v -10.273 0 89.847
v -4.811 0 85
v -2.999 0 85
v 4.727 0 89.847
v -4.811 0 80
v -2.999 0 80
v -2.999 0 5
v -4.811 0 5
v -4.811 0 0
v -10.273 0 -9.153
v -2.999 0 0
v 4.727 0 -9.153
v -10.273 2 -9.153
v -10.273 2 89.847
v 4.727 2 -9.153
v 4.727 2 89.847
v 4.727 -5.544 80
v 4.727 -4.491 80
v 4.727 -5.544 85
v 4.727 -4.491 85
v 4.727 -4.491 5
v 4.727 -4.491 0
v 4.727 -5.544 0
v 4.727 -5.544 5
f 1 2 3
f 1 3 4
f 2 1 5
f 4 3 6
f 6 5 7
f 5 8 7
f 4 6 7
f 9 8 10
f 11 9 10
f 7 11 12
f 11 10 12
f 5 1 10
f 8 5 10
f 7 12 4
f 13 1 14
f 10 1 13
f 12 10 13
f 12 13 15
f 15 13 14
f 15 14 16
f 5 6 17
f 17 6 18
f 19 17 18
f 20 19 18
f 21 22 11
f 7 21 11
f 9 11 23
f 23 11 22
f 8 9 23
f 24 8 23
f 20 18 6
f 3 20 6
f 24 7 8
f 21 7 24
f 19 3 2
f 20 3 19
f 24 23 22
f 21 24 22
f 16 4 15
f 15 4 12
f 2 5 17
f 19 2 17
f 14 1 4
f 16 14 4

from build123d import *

# Parameters (mm, degrees)
SKETCH_1_W      = 15
SKETCH_1_H      = 99
EXTRUDE_1_DEPTH = 2
EXTRUDE_2_DEPTH = 5
EXTRUDE_3_DEPTH = 5


with BuildPart() as part:
    # 草图1 → 凸台-拉伸1 (new body)
    with BuildSketch(Plane(origin=(0, 0, 0), x_dir=(1, 0, 0), z_dir=(0, 1, 0))):
        with Locations((-2.772511848, -40.347156398)):
            Rectangle(SKETCH_1_W, SKETCH_1_H)
    extrude(amount=EXTRUDE_1_DEPTH)

    # 草图3 → 凸台-拉伸2 (add)
    with BuildSketch(Plane.XY):
        Polygon((-4.810549778, 0), (4.727488152, -5.543936954), (4.727488152, -4.491111673), (-2.999221917, 0), align=None)
    extrude(amount=EXTRUDE_2_DEPTH)

    # 草图5 → 凸台-拉伸3 (add)
    with BuildSketch(Plane.XY.offset(80)):
        Polygon((-4.810549778, 0), (4.727488152, -5.543936954), (4.727488152, -4.491111673), (-2.999221917, 0), align=None)
    extrude(amount=EXTRUDE_3_DEPTH)


solid = part.part
